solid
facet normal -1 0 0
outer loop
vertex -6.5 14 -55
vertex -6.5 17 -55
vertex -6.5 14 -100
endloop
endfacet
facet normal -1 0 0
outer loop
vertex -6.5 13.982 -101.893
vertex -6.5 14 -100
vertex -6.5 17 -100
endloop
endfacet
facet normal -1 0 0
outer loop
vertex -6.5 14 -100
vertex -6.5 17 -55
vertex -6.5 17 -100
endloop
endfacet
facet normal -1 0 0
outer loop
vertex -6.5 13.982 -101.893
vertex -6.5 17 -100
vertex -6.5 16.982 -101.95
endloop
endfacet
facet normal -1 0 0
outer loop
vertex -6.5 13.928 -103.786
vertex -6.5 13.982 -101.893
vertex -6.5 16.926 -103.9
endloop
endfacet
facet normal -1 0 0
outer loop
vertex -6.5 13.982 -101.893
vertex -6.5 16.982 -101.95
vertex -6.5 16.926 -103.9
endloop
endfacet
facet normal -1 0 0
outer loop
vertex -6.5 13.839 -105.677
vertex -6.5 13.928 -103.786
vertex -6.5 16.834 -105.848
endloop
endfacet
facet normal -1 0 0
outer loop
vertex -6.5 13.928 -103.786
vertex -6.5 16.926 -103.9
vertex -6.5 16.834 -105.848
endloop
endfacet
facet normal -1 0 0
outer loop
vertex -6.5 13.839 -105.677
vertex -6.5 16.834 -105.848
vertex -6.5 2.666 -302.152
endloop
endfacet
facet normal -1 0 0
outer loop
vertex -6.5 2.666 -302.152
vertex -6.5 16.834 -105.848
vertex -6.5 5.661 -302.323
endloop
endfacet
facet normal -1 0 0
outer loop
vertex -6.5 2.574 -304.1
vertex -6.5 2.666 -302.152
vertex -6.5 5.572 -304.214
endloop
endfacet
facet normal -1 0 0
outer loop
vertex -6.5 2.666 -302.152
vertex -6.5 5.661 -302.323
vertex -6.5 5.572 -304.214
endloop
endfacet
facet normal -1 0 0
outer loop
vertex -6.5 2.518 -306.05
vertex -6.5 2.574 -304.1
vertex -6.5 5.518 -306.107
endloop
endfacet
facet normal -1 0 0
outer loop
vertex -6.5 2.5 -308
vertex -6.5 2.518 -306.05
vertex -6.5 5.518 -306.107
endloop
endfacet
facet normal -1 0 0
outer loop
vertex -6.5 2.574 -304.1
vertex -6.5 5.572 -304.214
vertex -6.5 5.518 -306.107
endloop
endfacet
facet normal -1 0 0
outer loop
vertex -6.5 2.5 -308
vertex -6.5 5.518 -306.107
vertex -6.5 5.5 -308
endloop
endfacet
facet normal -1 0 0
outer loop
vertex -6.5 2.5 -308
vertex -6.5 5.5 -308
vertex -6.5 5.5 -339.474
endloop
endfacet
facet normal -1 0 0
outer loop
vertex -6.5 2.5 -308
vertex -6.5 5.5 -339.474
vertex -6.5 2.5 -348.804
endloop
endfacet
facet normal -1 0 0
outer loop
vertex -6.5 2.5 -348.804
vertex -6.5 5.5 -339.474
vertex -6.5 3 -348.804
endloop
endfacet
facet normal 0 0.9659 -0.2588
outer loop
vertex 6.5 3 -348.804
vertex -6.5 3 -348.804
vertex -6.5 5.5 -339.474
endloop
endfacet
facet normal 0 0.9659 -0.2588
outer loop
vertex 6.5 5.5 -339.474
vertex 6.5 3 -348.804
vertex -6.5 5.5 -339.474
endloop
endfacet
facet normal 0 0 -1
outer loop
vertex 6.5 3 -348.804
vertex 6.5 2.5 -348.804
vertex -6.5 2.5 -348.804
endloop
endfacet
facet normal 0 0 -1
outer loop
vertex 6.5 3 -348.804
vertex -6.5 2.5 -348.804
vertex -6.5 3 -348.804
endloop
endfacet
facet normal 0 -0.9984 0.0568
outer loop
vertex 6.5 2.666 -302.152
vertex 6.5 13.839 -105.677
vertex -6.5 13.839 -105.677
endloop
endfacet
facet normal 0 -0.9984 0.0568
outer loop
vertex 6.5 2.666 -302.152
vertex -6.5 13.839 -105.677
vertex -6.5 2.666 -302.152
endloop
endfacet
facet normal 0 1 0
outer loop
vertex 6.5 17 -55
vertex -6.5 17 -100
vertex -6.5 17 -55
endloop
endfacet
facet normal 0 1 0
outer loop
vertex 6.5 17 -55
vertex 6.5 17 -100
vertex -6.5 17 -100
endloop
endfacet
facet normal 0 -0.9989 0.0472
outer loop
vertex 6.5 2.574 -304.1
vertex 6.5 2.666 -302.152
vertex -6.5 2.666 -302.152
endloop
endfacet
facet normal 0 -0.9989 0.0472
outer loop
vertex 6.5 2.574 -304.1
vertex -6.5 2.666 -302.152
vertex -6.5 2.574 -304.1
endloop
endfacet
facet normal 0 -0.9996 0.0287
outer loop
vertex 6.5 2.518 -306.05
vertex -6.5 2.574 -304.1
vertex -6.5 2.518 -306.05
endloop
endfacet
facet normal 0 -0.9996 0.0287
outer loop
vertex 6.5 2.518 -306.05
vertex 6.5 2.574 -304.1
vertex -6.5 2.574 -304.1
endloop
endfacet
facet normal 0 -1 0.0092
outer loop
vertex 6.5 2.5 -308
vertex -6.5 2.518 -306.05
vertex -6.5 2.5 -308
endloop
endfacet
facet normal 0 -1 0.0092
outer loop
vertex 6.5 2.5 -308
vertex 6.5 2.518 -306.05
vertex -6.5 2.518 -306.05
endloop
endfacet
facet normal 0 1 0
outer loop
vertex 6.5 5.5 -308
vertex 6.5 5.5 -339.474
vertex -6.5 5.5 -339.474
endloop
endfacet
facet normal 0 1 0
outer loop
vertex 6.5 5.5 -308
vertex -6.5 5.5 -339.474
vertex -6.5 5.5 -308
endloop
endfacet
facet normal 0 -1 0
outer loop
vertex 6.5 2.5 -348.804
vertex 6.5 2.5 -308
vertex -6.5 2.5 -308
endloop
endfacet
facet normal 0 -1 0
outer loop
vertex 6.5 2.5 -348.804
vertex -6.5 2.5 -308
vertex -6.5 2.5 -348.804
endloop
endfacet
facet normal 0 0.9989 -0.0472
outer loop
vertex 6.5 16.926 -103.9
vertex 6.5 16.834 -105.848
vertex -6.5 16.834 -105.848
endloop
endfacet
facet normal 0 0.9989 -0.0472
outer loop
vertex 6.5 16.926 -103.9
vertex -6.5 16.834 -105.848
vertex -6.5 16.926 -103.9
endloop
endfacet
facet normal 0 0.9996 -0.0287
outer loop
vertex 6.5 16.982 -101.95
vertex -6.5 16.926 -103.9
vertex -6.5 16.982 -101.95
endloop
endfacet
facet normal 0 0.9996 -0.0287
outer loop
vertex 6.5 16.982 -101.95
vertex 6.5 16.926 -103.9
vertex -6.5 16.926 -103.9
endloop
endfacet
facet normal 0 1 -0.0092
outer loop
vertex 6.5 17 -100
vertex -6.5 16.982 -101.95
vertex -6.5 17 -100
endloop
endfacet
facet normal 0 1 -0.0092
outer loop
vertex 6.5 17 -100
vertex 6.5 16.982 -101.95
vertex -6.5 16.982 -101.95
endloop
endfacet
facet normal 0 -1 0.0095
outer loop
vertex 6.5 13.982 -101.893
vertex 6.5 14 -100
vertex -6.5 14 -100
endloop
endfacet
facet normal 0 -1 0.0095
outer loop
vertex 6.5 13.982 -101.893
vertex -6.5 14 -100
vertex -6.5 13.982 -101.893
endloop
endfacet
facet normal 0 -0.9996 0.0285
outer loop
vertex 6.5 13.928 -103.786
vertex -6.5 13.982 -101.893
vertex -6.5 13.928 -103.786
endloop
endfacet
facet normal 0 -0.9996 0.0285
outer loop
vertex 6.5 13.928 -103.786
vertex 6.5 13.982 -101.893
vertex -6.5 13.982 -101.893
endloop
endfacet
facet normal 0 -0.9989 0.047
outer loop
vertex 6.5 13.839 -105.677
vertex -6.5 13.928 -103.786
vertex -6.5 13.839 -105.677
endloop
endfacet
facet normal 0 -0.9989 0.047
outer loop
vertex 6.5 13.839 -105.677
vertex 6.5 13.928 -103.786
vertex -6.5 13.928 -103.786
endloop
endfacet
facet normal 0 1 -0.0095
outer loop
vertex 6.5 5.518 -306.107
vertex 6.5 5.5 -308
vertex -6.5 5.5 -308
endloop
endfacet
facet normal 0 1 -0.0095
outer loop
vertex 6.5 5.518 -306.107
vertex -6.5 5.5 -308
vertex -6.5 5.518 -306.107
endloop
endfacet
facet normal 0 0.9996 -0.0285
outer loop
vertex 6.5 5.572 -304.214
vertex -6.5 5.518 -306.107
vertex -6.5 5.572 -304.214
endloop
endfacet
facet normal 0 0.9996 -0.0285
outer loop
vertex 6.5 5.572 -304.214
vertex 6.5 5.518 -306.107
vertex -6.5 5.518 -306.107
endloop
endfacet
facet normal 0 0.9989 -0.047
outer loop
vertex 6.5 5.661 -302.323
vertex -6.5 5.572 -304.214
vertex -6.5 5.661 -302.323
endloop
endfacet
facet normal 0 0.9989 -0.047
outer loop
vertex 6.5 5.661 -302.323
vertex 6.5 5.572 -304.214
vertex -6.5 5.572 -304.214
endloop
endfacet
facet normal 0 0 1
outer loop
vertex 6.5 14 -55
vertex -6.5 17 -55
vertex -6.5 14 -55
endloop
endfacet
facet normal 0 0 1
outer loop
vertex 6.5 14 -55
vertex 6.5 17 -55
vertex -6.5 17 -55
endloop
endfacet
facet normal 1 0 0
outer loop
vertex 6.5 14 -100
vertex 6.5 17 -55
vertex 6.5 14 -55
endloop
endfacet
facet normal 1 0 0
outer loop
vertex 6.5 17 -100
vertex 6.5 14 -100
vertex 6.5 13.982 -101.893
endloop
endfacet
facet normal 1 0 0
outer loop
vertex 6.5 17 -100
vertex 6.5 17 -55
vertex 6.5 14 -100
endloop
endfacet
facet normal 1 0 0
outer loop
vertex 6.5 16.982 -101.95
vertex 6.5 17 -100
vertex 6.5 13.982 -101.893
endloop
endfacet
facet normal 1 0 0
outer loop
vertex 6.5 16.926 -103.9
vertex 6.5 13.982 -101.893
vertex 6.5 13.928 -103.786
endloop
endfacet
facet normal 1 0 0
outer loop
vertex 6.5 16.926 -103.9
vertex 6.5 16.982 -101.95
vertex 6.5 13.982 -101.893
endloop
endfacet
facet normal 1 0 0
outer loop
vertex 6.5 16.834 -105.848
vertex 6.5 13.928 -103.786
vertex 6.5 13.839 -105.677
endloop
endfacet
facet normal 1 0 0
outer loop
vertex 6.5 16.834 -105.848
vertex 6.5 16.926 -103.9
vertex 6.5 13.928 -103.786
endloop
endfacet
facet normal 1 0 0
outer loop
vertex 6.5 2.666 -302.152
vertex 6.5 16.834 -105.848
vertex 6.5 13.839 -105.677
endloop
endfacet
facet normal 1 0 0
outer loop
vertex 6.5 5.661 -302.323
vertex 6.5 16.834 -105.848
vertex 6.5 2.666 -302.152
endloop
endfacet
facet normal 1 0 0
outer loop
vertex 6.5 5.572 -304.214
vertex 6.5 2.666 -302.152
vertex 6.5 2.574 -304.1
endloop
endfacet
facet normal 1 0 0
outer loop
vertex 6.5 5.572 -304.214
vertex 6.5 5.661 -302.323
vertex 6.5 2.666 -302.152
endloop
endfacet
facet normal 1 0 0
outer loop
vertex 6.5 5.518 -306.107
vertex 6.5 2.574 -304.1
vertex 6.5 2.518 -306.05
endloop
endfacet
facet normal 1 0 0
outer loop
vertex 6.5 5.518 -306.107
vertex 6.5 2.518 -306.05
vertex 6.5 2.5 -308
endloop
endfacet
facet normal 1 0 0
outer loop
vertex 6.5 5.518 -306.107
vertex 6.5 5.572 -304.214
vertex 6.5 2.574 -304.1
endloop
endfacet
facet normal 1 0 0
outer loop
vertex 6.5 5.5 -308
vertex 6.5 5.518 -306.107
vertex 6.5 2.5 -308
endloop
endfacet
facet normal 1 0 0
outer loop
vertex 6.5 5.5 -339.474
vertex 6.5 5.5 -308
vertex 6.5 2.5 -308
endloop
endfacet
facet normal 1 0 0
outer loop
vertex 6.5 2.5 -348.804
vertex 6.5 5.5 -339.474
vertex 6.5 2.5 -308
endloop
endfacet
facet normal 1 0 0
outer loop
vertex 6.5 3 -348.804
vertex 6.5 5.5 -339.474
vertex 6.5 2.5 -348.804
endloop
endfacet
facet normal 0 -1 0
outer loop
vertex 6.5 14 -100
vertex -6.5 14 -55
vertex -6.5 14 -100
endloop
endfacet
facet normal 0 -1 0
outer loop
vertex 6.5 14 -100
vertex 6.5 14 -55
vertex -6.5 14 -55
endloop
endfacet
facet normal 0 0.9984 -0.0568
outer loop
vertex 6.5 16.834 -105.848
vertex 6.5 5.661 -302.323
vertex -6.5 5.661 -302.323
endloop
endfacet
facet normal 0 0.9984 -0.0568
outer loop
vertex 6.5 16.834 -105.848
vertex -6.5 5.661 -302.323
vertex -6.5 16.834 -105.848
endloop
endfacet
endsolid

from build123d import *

# Parameters (mm, degrees)
EXTRUDE1_DEPTH = 6.5


with BuildPart() as part:
    # Sketch1 → Extrude1 (new body, symmetric)
    with BuildSketch(Plane(origin=(0, 0, 0), x_dir=(0, 0, -1), z_dir=(1, 0, 0))):
        with BuildLine():
            Line((55, 14), (100, 14))
            ThreePointArc((100, 14), (102.839816619, 13.959669075), (105.67734259, 13.838708831))
            Line((105.67734259, 13.838708831), (302.152337132, 2.666129904))
            ThreePointArc((302.152337132, 2.666129904), (305.074988882, 2.541540853), (308, 2.5))
            Line((308, 2.5), (348.803847577, 2.5))
            Line((348.803847577, 2.5), (348.803847577, 3))
            Line((348.803847577, 3), (339.473720558, 5.5))
            Line((339.473720558, 5.5), (308, 5.5))
            ThreePointArc((308, 5.5), (305.160183381, 5.540330925), (302.32265741, 5.661291169))
            Line((302.32265741, 5.661291169), (105.847662868, 16.833870096))
            ThreePointArc((105.847662868, 16.833870096), (102.925011118, 16.958459147), (100, 17))
            Line((100, 17), (55, 17))
            Line((55, 17), (55, 14))
        make_face()
    extrude(amount=EXTRUDE1_DEPTH, both=True)


solid = part.part
